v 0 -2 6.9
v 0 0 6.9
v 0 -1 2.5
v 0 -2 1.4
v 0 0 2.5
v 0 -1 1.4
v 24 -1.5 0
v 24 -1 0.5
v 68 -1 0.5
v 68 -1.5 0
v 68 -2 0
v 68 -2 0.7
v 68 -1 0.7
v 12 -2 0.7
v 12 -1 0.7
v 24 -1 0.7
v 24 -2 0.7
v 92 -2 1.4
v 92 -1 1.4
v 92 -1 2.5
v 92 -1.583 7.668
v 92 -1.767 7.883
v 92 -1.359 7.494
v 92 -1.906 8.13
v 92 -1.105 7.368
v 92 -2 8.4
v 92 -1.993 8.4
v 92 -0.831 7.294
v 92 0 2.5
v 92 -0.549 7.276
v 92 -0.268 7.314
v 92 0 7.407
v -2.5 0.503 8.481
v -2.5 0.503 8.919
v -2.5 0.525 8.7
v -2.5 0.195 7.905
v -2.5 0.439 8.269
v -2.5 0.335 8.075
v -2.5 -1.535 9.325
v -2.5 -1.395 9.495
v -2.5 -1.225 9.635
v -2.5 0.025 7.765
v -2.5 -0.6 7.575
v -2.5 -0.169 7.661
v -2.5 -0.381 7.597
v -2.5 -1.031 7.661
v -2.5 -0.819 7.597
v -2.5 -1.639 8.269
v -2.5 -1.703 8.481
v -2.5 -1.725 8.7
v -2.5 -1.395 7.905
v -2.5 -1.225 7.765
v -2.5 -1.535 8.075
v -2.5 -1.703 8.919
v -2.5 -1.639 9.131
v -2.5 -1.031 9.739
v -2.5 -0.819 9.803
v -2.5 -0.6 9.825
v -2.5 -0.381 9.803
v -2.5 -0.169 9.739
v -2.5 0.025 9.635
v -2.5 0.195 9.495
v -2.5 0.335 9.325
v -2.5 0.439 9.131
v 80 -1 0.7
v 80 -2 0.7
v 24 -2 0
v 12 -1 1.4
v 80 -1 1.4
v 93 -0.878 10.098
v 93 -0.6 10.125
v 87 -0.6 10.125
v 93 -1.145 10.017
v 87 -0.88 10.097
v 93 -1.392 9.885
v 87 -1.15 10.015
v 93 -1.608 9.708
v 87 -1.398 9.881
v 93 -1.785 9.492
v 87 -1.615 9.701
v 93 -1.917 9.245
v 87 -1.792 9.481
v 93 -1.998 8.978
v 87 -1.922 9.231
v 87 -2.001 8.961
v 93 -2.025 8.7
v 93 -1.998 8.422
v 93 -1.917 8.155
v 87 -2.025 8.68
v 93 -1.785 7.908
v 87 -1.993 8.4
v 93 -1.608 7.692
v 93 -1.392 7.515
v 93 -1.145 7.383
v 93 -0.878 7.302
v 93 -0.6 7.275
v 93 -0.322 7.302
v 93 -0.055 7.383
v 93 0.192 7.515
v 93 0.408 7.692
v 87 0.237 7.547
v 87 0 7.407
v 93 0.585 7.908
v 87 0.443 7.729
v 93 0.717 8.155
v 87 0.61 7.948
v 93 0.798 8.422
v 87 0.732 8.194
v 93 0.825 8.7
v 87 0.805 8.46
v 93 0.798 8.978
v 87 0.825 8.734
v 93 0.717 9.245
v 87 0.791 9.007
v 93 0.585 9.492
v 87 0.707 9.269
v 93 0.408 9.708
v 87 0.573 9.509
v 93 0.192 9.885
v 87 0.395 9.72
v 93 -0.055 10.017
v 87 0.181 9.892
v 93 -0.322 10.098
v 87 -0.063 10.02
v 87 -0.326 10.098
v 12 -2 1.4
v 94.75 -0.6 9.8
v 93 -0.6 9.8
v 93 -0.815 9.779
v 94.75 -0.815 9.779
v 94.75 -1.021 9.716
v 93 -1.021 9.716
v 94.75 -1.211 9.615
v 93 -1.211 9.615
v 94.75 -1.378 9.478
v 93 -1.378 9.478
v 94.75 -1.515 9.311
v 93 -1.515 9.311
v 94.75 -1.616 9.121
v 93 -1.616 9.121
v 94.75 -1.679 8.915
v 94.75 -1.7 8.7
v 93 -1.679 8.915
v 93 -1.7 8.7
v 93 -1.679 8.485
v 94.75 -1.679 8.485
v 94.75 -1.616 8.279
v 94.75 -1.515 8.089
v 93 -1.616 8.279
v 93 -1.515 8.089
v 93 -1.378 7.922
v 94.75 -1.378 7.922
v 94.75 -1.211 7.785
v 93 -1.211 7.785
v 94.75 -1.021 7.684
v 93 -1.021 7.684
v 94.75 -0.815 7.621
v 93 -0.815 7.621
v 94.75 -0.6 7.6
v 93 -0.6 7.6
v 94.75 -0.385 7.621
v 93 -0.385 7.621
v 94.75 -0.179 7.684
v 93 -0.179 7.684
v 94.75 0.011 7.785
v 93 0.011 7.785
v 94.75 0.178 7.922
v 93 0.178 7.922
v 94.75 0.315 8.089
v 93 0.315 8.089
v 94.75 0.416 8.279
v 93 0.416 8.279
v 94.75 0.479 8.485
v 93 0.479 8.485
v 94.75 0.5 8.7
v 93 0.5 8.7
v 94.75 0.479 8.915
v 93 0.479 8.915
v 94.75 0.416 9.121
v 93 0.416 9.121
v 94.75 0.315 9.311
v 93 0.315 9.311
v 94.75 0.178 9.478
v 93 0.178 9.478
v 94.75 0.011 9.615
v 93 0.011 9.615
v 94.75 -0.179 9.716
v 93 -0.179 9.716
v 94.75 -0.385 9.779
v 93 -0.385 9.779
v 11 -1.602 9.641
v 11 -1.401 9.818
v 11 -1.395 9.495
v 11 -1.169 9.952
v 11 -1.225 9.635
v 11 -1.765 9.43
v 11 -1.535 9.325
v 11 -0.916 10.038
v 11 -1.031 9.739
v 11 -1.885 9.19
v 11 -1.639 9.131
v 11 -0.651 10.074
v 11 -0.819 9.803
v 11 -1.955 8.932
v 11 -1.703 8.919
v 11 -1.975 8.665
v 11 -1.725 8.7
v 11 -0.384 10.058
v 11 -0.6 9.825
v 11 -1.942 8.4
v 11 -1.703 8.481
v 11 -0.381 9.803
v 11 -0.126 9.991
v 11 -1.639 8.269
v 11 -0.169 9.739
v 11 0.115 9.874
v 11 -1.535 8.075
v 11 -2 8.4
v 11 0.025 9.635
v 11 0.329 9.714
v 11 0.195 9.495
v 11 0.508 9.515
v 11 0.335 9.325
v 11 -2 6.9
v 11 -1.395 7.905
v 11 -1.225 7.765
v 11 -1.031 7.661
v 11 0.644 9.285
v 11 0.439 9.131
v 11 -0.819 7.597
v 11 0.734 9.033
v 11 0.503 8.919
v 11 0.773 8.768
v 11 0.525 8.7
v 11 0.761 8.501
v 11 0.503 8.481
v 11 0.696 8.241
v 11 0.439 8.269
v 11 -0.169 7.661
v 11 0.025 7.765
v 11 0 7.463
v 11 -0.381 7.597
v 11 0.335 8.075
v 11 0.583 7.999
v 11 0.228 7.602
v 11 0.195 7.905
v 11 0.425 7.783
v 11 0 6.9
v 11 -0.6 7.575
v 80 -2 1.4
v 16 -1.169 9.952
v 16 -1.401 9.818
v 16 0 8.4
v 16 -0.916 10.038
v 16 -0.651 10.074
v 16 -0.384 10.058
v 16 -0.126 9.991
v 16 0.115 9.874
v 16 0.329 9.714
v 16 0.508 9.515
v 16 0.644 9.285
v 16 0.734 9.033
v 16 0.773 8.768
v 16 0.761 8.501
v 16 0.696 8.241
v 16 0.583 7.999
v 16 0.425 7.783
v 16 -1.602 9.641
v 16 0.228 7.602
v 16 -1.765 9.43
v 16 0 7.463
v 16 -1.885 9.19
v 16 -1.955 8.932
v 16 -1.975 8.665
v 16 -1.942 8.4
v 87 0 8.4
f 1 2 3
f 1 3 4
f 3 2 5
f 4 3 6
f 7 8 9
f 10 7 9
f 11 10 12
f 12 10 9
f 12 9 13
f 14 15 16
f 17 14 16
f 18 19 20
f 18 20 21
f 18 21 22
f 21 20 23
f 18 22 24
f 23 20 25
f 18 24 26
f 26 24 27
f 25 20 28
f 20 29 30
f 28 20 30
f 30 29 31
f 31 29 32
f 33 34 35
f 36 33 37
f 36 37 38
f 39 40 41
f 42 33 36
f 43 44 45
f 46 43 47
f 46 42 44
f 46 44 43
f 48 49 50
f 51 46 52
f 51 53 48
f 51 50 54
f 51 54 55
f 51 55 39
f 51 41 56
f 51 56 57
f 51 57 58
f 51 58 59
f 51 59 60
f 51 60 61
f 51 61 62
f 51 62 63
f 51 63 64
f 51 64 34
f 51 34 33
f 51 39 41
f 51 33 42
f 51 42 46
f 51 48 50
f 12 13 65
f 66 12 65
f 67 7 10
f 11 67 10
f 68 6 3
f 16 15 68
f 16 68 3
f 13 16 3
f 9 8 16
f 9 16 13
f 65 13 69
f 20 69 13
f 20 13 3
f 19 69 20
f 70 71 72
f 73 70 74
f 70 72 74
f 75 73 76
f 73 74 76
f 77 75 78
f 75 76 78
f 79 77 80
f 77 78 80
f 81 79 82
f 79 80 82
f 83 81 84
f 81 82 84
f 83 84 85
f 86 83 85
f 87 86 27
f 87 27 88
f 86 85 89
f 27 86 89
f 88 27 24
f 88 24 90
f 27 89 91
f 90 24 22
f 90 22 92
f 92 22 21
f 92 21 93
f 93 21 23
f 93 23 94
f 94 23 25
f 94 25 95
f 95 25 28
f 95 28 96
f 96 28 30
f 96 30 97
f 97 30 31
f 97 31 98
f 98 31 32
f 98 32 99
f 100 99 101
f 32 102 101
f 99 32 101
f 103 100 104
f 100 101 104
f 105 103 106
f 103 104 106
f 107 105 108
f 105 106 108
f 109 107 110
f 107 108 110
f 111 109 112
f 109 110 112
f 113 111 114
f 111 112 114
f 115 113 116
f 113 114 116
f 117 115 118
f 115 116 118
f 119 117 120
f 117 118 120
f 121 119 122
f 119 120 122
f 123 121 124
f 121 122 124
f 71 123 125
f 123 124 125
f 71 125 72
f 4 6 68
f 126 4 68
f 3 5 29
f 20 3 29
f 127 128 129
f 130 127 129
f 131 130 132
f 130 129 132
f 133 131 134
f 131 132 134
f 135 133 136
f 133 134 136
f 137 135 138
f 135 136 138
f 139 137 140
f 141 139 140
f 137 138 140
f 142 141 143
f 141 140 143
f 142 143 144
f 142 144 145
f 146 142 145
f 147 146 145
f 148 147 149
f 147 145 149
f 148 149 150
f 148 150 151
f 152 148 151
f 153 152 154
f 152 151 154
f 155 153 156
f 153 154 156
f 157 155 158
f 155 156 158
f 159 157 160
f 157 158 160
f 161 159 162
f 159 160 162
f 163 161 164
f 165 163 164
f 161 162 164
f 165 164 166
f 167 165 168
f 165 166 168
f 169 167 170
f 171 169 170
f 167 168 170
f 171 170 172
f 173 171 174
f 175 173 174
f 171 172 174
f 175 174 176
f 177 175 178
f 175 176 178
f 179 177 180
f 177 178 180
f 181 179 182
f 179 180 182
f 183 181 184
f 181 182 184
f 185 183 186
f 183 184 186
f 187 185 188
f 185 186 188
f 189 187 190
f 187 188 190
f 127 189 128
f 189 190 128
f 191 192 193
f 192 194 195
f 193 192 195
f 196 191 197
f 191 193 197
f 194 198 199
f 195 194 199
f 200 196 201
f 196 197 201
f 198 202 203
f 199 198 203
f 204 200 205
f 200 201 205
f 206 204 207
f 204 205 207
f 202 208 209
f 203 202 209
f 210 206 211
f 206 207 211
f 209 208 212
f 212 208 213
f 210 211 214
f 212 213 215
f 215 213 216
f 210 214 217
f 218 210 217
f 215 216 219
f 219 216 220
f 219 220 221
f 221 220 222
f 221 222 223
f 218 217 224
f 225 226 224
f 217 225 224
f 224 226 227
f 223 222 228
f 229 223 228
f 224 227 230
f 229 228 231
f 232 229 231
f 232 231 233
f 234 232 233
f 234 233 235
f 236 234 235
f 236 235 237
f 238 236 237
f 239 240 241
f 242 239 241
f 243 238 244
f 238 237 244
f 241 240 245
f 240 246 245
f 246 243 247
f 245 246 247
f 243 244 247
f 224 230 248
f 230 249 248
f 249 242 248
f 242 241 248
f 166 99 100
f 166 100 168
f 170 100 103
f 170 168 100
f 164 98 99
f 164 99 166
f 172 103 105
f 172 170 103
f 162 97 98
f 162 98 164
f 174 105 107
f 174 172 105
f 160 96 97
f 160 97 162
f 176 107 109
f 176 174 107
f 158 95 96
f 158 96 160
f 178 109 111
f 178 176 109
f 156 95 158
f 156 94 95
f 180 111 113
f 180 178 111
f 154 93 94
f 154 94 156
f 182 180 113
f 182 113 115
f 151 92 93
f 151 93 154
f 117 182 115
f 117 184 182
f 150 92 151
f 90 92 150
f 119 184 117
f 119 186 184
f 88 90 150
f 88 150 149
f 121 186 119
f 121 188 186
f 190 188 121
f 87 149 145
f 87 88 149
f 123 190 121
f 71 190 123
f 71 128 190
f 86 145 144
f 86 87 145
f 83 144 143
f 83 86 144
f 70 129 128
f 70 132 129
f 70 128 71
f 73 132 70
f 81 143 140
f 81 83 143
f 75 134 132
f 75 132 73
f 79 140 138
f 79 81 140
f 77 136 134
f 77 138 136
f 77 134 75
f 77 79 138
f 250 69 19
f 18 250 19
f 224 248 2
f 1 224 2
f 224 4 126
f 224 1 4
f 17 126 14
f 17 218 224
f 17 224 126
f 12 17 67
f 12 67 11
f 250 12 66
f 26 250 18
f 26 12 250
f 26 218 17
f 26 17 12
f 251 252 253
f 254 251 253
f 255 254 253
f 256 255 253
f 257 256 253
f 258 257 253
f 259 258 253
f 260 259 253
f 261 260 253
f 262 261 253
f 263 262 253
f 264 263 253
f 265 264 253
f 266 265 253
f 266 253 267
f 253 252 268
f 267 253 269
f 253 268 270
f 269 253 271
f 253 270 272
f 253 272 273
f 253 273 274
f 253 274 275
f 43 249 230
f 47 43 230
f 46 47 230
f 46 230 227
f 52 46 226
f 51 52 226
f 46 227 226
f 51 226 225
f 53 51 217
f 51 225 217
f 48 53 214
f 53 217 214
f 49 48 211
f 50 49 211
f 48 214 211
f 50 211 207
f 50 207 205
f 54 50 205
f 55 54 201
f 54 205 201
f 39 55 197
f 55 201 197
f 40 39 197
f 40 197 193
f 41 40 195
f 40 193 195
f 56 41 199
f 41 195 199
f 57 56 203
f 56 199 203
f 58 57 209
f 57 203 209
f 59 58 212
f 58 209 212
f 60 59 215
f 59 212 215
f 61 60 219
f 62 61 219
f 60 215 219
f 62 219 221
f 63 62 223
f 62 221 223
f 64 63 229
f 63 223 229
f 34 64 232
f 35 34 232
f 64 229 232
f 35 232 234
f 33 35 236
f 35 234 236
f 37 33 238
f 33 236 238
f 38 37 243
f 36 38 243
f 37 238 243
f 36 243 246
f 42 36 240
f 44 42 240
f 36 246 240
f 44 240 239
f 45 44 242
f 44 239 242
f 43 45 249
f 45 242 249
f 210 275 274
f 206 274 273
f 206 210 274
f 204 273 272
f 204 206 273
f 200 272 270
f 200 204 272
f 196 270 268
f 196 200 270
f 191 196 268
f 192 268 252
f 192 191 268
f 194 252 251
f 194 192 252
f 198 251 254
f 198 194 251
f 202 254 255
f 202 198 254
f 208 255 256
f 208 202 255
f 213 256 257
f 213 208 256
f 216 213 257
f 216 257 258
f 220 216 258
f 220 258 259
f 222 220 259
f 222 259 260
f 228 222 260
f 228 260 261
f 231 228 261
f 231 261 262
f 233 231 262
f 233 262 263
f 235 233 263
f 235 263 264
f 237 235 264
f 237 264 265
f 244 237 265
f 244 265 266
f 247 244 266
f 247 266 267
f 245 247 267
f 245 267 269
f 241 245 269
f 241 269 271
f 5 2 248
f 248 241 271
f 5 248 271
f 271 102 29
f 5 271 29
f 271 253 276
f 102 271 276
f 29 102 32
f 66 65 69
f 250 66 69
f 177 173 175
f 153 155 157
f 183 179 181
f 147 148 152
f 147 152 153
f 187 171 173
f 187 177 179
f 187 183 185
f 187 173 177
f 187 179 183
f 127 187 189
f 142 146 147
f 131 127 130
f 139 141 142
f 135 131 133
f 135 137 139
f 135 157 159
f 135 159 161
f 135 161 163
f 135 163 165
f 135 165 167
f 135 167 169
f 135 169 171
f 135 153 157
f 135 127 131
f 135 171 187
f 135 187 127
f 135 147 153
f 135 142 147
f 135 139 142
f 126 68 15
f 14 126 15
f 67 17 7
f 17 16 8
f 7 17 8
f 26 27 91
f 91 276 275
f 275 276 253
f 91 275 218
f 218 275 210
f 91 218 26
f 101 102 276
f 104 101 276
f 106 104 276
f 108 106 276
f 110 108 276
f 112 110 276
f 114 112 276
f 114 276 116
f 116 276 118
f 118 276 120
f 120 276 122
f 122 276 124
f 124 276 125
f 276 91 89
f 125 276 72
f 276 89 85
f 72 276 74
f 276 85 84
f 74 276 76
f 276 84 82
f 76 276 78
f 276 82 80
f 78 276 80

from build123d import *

# Parameters (mm, degrees)
PAD_DEPTH    = 2
SKETCH001_R  = 1.425
PAD001_DEPTH = 1
SKETCH002_R  = 1.425
PAD002_DEPTH = 5
SKETCH003_R  = 1.1
PAD003_DEPTH = 1.75
SKETCH004_R  = 1.375
PAD004_DEPTH = 5
SKETCH005_R  = 1.125
PAD005_DEPTH = 13.5
SKETCH006_W  = 92
SKETCH006_H  = 2.5
POCKET_DEPTH = 1
CHAMFER_SIZE = 0.5


with BuildPart() as part:
    # Sketch → Pad (new body)
    with BuildSketch(Plane.XZ):
        Polygon((0, 1.4), (12, 1.4), (12, 0.7), (24, 0.7), (24, 0), (68, 0), (68, 0.7), (80, 0.7), (80, 1.4), (92, 1.4), (92, 8.4), (11, 8.4), (11, 6.9), (0, 6.9), align=None)
    extrude(amount=PAD_DEPTH)

    # Sketch001 (on Face10 of Pad) → Pad001 (join)
    with BuildSketch(Plane(origin=(92, 0, 0), x_dir=(0, 0, 1), z_dir=(1, 0, 0))):
        with Locations((8.7, 0.6)):
            Circle(SKETCH001_R)
    extrude(amount=PAD001_DEPTH)

    # Sketch002 (on Face14 of Pad001) → Pad002 (join)
    with BuildSketch(Plane(origin=(92, 0, 0), x_dir=(0, 0, 1), z_dir=(1, 0, 0))):
        with Locations((8.7, 0.6)):
            Circle(SKETCH002_R)
    extrude(amount=-PAD002_DEPTH)

    # Sketch003 (on Face19 of Pad002) → Pad003 (join)
    with BuildSketch(Plane(origin=(93, 0, 0), x_dir=(0, 0, 1), z_dir=(1, 0, 0))):
        with Locations((8.7, 0.6)):
            Circle(SKETCH003_R)
    extrude(amount=PAD003_DEPTH)

    # Sketch004 (on Face18 of Pad003) → Pad004 (join)
    with BuildSketch(Plane(origin=(11, 0, 0), x_dir=(0, 0, -1), z_dir=(-1, 0, 0))):
        with Locations((-8.7, 0.6)):
            Circle(SKETCH004_R)
    extrude(amount=-PAD004_DEPTH)

    # Sketch005 (on Face23 of Pad004) → Pad005 (join)
    with BuildSketch(Plane(origin=(11, 0, 0), x_dir=(0, 0, -1), z_dir=(-1, 0, 0))):
        with Locations((-8.7, 0.6)):
            Circle(SKETCH005_R)
    extrude(amount=PAD005_DEPTH)

    # Sketch006 (on Face4 of Pad005) → Pocket (cut)
    with BuildSketch(Plane(origin=(0, 0, 0), x_dir=(1, 0, 0), z_dir=(0, 1, 0))):
        with Locations((46, -1.25)):
            Rectangle(SKETCH006_W, SKETCH006_H)
    extrude(amount=-POCKET_DEPTH, mode=Mode.SUBTRACT)

    # Chamfer
    chamfer_edges = [part.edges().sort_by_distance(p)[0] for p in [
        (46, -1, 0),
    ]]
    chamfer(chamfer_edges, length=CHAMFER_SIZE)


solid = part.part
